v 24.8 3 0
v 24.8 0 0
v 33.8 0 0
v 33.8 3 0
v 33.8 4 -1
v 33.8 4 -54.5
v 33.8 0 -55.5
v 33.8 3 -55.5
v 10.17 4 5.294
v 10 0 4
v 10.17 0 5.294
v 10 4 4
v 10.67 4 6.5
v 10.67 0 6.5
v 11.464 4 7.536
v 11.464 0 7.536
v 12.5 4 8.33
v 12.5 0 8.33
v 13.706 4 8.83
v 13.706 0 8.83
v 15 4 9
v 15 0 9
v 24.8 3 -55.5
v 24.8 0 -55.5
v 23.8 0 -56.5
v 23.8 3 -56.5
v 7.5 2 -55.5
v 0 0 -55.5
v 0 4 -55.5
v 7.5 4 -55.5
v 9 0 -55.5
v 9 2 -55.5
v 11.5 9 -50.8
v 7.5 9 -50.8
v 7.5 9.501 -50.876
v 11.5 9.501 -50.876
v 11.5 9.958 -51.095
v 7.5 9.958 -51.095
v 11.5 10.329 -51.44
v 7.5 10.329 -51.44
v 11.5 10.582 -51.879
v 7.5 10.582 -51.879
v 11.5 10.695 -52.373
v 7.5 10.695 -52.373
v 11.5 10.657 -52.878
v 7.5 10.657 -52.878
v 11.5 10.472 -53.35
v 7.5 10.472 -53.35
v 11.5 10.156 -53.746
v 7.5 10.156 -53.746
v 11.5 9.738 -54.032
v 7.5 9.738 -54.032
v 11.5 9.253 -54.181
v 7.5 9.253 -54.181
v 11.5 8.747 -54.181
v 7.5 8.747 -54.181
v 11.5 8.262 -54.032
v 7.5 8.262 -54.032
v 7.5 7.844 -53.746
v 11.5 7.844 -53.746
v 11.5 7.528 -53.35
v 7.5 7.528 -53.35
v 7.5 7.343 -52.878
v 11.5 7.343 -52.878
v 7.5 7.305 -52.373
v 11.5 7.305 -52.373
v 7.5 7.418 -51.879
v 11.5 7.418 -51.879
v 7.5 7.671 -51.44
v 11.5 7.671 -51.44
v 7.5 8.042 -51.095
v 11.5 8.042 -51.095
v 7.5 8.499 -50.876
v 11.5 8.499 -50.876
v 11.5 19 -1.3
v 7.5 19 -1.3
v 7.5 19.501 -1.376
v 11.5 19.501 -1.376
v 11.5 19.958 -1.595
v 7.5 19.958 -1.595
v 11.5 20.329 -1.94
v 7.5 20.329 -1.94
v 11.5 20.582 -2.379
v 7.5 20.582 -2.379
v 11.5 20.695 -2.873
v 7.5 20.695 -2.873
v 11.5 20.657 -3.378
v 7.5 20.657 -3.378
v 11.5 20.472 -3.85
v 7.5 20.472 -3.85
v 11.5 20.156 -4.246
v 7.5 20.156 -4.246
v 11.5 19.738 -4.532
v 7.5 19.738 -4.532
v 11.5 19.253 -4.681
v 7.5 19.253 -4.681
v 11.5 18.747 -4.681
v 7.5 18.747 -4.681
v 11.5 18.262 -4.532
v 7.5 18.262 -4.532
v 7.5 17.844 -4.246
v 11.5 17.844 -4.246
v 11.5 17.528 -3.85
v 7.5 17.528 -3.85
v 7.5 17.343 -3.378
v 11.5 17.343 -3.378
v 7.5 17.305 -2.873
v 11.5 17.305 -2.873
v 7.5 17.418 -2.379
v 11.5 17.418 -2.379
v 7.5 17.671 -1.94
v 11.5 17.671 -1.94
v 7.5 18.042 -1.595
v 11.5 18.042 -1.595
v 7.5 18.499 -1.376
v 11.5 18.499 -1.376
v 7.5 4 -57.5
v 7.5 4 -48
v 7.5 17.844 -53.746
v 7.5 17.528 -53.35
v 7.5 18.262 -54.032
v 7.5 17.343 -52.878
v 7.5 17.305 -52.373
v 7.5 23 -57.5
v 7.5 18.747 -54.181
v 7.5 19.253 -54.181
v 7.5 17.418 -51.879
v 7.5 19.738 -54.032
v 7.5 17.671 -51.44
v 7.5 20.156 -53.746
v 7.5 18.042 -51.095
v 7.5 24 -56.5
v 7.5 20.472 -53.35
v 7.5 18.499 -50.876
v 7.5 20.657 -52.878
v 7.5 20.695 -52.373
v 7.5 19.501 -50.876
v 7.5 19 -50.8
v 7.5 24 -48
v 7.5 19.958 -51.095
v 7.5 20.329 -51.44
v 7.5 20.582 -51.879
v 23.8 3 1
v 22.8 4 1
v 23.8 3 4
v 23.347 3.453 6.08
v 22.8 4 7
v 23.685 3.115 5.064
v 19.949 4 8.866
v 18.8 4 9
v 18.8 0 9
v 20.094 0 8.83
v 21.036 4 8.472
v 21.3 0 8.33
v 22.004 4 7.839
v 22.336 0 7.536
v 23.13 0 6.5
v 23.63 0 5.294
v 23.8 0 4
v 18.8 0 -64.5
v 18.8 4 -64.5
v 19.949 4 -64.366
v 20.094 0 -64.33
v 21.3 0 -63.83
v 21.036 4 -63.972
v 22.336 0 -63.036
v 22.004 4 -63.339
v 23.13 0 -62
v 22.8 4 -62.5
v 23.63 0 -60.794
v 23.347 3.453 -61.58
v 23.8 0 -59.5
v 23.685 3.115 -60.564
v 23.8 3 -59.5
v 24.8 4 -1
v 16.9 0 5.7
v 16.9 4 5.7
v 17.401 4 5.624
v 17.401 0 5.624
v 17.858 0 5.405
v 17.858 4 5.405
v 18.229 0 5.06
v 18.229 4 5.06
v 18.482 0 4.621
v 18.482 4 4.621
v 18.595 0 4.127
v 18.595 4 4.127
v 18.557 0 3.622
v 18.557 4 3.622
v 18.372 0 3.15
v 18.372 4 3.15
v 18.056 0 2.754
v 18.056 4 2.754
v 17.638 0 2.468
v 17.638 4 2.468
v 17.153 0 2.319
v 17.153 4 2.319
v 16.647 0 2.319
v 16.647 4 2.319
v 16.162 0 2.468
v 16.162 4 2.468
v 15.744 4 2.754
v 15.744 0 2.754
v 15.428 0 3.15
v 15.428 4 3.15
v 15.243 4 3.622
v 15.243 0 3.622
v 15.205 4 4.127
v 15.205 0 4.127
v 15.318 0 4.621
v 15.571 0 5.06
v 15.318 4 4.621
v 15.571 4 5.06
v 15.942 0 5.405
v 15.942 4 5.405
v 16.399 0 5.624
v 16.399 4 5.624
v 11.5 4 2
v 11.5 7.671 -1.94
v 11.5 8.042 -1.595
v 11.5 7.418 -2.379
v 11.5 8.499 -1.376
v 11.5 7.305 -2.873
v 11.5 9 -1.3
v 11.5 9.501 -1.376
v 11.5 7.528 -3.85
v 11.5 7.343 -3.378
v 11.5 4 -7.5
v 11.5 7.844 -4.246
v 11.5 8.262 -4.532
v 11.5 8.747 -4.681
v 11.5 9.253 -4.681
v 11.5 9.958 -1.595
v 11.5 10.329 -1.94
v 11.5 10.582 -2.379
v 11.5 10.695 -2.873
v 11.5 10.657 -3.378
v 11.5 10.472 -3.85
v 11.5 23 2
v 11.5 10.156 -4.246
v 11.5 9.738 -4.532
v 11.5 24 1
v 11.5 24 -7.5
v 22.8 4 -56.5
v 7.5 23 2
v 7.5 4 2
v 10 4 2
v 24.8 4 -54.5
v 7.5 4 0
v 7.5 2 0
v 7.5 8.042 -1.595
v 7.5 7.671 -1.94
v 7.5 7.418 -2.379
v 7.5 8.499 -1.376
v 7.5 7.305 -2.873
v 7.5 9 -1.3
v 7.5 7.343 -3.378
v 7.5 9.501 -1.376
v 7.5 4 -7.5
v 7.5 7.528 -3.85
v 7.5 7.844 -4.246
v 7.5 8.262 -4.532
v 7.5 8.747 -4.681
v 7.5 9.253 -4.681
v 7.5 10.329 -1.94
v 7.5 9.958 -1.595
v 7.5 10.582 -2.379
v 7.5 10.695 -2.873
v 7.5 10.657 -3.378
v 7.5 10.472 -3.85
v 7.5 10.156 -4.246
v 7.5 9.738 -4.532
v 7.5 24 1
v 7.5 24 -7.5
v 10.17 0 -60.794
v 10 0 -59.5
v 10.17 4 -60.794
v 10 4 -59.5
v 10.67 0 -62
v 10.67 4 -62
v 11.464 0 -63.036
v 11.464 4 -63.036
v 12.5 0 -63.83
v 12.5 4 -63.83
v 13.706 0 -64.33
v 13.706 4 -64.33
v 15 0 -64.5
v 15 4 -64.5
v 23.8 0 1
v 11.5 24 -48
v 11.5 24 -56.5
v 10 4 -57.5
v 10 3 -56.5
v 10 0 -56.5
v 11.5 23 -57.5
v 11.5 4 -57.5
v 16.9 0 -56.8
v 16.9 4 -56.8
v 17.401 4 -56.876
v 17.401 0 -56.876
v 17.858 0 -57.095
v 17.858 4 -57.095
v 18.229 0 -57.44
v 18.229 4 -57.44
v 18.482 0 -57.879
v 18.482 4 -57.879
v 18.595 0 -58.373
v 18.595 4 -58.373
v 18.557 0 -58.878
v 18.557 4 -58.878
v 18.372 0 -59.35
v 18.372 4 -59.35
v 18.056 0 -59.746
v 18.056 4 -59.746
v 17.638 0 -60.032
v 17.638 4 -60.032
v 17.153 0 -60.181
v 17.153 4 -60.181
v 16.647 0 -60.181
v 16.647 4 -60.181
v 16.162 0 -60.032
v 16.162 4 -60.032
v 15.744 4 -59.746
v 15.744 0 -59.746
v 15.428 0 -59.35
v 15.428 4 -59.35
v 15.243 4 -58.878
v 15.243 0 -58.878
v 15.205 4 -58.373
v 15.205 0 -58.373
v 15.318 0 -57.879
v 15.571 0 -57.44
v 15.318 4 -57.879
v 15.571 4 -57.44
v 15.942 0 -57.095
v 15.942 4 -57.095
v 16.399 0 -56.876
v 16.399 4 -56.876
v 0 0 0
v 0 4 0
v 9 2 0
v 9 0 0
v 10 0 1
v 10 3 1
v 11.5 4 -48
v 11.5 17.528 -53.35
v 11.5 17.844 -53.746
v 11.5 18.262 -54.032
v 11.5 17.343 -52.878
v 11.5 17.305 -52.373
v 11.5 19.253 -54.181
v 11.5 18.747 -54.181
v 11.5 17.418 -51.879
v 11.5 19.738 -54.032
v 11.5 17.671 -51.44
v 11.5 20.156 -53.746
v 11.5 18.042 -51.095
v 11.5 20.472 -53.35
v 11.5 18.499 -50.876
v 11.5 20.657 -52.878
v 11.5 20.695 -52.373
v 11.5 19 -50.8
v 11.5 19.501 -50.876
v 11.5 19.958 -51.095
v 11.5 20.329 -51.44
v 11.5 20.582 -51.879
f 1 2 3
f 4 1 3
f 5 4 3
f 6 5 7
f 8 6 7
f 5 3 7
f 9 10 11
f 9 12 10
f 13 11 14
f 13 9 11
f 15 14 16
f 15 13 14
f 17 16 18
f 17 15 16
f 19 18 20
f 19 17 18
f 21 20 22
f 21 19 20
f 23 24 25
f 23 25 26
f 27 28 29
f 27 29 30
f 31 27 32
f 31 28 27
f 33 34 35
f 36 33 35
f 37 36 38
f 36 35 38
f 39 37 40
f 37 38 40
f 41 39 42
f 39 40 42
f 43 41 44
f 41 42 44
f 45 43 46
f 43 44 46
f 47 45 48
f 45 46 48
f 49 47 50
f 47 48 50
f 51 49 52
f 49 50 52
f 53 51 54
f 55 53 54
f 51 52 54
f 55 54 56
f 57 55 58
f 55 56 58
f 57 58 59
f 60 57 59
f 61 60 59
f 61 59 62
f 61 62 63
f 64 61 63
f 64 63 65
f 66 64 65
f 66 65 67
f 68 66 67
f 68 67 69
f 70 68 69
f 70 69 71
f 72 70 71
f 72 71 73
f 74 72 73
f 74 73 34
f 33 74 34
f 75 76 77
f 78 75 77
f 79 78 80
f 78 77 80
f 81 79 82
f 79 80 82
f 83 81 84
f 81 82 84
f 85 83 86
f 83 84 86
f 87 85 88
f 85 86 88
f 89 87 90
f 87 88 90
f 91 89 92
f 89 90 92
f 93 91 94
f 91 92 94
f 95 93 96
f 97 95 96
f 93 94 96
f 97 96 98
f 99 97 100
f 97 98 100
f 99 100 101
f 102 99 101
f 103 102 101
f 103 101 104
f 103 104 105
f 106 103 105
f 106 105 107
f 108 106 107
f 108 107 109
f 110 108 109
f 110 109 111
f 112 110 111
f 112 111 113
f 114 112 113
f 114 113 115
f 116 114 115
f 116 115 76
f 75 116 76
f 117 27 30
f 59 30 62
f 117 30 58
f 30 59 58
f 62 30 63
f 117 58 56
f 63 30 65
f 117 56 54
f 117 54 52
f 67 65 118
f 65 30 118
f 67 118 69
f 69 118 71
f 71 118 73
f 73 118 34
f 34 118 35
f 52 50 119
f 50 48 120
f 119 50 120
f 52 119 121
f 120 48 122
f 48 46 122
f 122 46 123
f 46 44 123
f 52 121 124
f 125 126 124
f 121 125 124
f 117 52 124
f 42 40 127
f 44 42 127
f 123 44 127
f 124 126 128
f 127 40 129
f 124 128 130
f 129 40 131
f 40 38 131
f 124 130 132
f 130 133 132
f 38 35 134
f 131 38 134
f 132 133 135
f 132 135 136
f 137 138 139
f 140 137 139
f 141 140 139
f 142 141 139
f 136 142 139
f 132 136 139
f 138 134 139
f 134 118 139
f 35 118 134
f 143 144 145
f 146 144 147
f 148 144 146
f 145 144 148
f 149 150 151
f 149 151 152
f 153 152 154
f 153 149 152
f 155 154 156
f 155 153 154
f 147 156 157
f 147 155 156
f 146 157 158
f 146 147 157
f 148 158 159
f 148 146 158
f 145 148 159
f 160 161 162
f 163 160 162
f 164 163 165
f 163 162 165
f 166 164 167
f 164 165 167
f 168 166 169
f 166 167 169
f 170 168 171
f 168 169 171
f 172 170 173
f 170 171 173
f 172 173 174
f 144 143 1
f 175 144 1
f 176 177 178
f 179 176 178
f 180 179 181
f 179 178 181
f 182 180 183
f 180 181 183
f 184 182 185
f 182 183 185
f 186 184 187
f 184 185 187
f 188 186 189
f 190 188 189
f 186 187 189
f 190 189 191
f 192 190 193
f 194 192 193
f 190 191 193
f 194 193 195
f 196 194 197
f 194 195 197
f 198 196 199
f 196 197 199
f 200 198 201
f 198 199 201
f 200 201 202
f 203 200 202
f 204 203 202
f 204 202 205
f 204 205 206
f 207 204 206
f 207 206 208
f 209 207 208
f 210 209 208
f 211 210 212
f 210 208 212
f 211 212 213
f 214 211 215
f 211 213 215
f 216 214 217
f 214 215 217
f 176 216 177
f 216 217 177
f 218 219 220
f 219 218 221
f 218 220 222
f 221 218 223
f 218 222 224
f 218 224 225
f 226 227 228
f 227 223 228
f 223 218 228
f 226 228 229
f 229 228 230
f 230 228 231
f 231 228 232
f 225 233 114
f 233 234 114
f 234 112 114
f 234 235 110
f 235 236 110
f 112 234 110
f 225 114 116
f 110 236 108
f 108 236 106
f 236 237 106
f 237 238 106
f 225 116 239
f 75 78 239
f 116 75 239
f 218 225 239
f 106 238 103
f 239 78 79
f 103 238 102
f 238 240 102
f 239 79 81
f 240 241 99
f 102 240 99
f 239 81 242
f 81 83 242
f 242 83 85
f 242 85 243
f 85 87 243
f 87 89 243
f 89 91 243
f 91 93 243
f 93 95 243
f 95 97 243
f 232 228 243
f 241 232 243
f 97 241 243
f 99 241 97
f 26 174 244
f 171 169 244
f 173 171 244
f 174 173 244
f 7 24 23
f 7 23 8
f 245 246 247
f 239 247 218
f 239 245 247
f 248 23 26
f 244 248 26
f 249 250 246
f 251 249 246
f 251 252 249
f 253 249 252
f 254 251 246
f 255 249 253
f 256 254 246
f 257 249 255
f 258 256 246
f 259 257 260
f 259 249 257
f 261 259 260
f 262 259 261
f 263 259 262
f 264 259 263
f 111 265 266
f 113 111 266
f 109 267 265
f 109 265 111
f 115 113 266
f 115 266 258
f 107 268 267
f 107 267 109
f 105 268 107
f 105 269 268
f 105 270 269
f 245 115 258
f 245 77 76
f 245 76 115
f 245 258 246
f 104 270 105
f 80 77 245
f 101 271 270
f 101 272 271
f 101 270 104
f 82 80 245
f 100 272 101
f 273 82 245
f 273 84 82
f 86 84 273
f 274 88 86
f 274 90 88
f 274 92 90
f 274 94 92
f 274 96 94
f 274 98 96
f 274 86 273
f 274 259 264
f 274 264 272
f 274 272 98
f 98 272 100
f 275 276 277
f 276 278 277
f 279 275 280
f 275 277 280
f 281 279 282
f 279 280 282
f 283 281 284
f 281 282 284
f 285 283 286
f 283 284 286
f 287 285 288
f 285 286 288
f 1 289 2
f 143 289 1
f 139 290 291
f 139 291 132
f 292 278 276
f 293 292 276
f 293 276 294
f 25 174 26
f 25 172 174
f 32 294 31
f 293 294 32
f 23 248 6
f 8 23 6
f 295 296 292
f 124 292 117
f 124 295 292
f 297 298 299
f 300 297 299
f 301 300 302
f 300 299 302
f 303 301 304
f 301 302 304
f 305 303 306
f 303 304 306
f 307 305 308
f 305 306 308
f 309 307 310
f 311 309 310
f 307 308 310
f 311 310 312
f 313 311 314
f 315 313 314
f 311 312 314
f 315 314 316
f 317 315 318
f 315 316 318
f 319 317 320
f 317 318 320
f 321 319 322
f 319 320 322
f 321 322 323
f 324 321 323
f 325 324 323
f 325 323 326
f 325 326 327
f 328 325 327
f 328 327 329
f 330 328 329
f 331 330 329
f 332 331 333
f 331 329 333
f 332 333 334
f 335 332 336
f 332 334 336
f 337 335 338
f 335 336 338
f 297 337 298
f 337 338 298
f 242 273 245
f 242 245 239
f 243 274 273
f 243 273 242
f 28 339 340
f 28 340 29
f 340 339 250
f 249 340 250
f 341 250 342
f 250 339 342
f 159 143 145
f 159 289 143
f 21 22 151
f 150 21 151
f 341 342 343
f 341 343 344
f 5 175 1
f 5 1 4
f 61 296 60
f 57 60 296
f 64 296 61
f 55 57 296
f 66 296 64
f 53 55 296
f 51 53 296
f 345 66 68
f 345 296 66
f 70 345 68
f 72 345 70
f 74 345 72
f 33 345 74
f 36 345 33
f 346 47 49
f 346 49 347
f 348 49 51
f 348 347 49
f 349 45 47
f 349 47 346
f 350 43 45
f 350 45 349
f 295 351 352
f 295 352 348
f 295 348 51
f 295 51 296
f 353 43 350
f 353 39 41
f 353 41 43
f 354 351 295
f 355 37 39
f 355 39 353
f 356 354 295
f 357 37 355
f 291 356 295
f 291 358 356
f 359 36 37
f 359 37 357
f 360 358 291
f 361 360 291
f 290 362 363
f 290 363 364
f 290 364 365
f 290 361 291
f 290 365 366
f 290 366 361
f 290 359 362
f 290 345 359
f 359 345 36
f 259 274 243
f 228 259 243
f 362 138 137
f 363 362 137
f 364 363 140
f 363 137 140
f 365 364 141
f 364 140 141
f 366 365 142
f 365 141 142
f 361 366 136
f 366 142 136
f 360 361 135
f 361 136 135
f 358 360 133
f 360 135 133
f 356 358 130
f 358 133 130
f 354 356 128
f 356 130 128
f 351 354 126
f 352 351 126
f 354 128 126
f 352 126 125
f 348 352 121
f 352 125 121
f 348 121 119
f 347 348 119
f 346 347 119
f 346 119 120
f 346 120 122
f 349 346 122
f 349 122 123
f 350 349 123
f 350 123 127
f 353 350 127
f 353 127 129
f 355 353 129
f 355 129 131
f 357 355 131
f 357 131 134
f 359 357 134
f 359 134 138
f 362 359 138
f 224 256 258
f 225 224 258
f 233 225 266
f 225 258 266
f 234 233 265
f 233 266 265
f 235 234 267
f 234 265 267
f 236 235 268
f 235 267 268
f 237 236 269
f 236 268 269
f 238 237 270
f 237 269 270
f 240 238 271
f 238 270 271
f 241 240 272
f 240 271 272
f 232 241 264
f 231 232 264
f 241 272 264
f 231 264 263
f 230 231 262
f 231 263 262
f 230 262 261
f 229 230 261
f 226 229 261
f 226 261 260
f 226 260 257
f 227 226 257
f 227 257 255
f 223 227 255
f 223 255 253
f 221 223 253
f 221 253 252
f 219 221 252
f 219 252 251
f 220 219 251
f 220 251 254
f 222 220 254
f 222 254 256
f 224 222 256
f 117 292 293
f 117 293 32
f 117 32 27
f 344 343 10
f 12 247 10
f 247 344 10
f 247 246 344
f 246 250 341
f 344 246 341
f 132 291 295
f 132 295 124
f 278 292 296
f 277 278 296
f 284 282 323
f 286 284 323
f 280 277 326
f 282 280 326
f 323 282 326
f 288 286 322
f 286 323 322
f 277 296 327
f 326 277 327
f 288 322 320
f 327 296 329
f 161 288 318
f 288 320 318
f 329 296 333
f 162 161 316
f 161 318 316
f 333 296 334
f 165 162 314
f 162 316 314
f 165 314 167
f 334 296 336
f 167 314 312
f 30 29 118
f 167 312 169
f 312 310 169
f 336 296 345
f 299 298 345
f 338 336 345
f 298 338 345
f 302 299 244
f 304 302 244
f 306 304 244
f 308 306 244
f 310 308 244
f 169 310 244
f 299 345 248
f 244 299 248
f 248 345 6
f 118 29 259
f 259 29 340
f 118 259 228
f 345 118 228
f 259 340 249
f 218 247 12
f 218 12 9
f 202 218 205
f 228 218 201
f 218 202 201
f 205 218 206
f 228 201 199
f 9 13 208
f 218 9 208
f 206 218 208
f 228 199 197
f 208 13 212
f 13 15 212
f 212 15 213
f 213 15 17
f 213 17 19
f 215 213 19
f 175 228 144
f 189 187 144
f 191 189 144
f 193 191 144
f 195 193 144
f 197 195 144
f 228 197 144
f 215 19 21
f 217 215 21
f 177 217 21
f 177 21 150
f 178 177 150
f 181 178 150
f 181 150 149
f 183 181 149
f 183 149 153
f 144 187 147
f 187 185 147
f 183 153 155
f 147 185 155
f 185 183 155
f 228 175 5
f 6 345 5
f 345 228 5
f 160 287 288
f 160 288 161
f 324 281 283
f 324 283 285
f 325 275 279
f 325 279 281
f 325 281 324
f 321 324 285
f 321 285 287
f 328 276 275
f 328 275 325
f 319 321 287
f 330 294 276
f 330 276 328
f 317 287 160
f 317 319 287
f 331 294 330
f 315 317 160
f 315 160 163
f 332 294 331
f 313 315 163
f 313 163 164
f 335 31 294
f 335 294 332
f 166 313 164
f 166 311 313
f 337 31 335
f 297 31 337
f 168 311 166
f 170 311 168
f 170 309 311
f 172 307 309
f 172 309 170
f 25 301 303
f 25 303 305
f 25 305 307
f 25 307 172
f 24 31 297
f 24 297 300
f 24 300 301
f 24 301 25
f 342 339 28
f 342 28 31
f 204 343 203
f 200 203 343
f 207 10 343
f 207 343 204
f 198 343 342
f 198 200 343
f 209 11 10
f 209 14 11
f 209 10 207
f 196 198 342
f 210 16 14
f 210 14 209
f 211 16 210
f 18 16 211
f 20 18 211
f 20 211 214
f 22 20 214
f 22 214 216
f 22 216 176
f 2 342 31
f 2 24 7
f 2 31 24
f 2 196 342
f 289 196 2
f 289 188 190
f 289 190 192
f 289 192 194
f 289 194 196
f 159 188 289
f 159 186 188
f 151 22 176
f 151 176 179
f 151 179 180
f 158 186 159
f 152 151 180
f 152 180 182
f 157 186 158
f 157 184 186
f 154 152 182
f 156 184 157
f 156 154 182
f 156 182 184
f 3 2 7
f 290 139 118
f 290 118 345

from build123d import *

# Parameters (mm, degrees)
SKETCH1_W           = 33.8
SKETCH1_H           = 55.5
BOSS_EXTRUDE1_DEPTH = 4
SKETCH3_W           = 4
SKETCH3_H           = 7.5
BOSS_EXTRUDE2_DEPTH = 20
SKETCH4_R           = 1.7
CUT_EXTRUDE1_DEPTH  = 20
SKETCH5_W           = 4
SKETCH5_H           = 20
BOSS_EXTRUDE3_DEPTH = 2
SKETCH6_W           = 4
SKETCH6_H           = 20
BOSS_EXTRUDE4_DEPTH = 2
CHAMFER1_SIZE       = 2
CHAMFER3_SIZE       = 1
SKETCH7_W           = 13.8
SKETCH7_H           = 9
BOSS_EXTRUDE5_DEPTH = 4
CHAMFER4_SIZE       = 1
FILLET1_R           = 5
SKETCH8_R           = 1.7
CUT_EXTRUDE2_DEPTH  = 4


with BuildPart() as part:
    # Sketch1 → Boss-Extrude1 (new body)
    with BuildSketch(Plane(origin=(0, 0, 0), x_dir=(1, 0, 0), z_dir=(0, 1, 0))):
        with Locations((16.9, 27.75)):
            Rectangle(SKETCH1_W, SKETCH1_H)
    extrude(amount=BOSS_EXTRUDE1_DEPTH)

    # Sketch3 → Boss-Extrude2 (add)
    with BuildSketch(Plane(origin=(0, 4, 0), x_dir=(1, 0, 0), z_dir=(0, 1, 0))):
        with Locations((9.5, 3.75)):
            Rectangle(SKETCH3_W, SKETCH3_H)
        with Locations((9.5, 51.75)):
            Rectangle(SKETCH3_W, SKETCH3_H)
    extrude(amount=BOSS_EXTRUDE2_DEPTH)

    # Sketch4 → Cut-Extrude1 (cut)
    with BuildSketch(Plane.ZY.offset(-7.5)):
        with Locations((-3, 19)):
            Circle(SKETCH4_R)
        with Locations((-3, 9)):
            Circle(SKETCH4_R)
        with Locations((-52.5, 9)):
            Circle(SKETCH4_R)
        with Locations((-52.5, 19)):
            Circle(SKETCH4_R)
    extrude(amount=-CUT_EXTRUDE1_DEPTH, mode=Mode.SUBTRACT)

    # Sketch5 → Boss-Extrude3 (add)
    with BuildSketch(Plane.XY):
        with Locations((9.5, 14)):
            Rectangle(SKETCH5_W, SKETCH5_H)
    extrude(amount=BOSS_EXTRUDE3_DEPTH)

    # Sketch6 → Boss-Extrude4 (add)
    with BuildSketch(Plane(origin=(0, 0, -55.5), x_dir=(-1, 0, 0), z_dir=(0, 0, -1))):
        with Locations((-9.5, 14)):
            Rectangle(SKETCH6_W, SKETCH6_H)
    extrude(amount=BOSS_EXTRUDE4_DEPTH)

    # Chamfer1
    chamfer1_edges = [part.edges().sort_by_distance(p)[0] for p in [
        (9.5, 4, 0),
        (9.5, 4, -55.5),
    ]]
    chamfer(chamfer1_edges, length=CHAMFER1_SIZE - 0.0001)  # a hair under: the kernel refuses the full size

    # Chamfer3
    chamfer3_edges = [part.edges().sort_by_distance(p)[0] for p in [
        (9.5, 24, 2),
        (9.5, 24, -57.5),
    ]]
    chamfer(chamfer3_edges, length=CHAMFER3_SIZE)

    # Sketch7 → Boss-Extrude5 (add)
    with BuildSketch(Plane.XZ):
        with Locations((16.9, 4.5)):
            Rectangle(SKETCH7_W, SKETCH7_H)
        with Locations((16.9, -60)):
            Rectangle(SKETCH7_W, SKETCH7_H)
    extrude(amount=-BOSS_EXTRUDE5_DEPTH)

    # Chamfer4
    chamfer4_edges = [part.edges().sort_by_distance(p)[0] for p in [
        (28.8, 4, 0),
        (23.8, 2, 0),
        (10, 1.00005, 0),
        (23.8, 4, 4.5),
        (10, 1.00005, -55.5),
        (23.8, 4, -60),
        (23.8, 2, -55.5),
        (28.8, 4, -55.5),
    ]]
    chamfer(chamfer4_edges, length=CHAMFER4_SIZE)

    # Fillet1
    fillet1_edges = [part.edges().sort_by_distance(p)[0] for p in [
        (10, 2, -64.5),
        (23.8, 1.5, -64.5),
        (10, 2, 9),
        (23.8, 1.5, 9),
    ]]
    fillet(fillet1_edges, radius=FILLET1_R)

    # Sketch8 → Cut-Extrude2 (cut)
    with BuildSketch(Plane(origin=(0, 4, 0), x_dir=(1, 0, 0), z_dir=(0, 1, 0))):
        with Locations(Location((16.9, 58.5, 0), (0, 0, 270))):
            Circle(SKETCH8_R)
        with Locations(Location((16.9, -4, 0), (0, 0, 270))):
            Circle(SKETCH8_R)
    extrude(amount=-CUT_EXTRUDE2_DEPTH, mode=Mode.SUBTRACT)


solid = part.part
